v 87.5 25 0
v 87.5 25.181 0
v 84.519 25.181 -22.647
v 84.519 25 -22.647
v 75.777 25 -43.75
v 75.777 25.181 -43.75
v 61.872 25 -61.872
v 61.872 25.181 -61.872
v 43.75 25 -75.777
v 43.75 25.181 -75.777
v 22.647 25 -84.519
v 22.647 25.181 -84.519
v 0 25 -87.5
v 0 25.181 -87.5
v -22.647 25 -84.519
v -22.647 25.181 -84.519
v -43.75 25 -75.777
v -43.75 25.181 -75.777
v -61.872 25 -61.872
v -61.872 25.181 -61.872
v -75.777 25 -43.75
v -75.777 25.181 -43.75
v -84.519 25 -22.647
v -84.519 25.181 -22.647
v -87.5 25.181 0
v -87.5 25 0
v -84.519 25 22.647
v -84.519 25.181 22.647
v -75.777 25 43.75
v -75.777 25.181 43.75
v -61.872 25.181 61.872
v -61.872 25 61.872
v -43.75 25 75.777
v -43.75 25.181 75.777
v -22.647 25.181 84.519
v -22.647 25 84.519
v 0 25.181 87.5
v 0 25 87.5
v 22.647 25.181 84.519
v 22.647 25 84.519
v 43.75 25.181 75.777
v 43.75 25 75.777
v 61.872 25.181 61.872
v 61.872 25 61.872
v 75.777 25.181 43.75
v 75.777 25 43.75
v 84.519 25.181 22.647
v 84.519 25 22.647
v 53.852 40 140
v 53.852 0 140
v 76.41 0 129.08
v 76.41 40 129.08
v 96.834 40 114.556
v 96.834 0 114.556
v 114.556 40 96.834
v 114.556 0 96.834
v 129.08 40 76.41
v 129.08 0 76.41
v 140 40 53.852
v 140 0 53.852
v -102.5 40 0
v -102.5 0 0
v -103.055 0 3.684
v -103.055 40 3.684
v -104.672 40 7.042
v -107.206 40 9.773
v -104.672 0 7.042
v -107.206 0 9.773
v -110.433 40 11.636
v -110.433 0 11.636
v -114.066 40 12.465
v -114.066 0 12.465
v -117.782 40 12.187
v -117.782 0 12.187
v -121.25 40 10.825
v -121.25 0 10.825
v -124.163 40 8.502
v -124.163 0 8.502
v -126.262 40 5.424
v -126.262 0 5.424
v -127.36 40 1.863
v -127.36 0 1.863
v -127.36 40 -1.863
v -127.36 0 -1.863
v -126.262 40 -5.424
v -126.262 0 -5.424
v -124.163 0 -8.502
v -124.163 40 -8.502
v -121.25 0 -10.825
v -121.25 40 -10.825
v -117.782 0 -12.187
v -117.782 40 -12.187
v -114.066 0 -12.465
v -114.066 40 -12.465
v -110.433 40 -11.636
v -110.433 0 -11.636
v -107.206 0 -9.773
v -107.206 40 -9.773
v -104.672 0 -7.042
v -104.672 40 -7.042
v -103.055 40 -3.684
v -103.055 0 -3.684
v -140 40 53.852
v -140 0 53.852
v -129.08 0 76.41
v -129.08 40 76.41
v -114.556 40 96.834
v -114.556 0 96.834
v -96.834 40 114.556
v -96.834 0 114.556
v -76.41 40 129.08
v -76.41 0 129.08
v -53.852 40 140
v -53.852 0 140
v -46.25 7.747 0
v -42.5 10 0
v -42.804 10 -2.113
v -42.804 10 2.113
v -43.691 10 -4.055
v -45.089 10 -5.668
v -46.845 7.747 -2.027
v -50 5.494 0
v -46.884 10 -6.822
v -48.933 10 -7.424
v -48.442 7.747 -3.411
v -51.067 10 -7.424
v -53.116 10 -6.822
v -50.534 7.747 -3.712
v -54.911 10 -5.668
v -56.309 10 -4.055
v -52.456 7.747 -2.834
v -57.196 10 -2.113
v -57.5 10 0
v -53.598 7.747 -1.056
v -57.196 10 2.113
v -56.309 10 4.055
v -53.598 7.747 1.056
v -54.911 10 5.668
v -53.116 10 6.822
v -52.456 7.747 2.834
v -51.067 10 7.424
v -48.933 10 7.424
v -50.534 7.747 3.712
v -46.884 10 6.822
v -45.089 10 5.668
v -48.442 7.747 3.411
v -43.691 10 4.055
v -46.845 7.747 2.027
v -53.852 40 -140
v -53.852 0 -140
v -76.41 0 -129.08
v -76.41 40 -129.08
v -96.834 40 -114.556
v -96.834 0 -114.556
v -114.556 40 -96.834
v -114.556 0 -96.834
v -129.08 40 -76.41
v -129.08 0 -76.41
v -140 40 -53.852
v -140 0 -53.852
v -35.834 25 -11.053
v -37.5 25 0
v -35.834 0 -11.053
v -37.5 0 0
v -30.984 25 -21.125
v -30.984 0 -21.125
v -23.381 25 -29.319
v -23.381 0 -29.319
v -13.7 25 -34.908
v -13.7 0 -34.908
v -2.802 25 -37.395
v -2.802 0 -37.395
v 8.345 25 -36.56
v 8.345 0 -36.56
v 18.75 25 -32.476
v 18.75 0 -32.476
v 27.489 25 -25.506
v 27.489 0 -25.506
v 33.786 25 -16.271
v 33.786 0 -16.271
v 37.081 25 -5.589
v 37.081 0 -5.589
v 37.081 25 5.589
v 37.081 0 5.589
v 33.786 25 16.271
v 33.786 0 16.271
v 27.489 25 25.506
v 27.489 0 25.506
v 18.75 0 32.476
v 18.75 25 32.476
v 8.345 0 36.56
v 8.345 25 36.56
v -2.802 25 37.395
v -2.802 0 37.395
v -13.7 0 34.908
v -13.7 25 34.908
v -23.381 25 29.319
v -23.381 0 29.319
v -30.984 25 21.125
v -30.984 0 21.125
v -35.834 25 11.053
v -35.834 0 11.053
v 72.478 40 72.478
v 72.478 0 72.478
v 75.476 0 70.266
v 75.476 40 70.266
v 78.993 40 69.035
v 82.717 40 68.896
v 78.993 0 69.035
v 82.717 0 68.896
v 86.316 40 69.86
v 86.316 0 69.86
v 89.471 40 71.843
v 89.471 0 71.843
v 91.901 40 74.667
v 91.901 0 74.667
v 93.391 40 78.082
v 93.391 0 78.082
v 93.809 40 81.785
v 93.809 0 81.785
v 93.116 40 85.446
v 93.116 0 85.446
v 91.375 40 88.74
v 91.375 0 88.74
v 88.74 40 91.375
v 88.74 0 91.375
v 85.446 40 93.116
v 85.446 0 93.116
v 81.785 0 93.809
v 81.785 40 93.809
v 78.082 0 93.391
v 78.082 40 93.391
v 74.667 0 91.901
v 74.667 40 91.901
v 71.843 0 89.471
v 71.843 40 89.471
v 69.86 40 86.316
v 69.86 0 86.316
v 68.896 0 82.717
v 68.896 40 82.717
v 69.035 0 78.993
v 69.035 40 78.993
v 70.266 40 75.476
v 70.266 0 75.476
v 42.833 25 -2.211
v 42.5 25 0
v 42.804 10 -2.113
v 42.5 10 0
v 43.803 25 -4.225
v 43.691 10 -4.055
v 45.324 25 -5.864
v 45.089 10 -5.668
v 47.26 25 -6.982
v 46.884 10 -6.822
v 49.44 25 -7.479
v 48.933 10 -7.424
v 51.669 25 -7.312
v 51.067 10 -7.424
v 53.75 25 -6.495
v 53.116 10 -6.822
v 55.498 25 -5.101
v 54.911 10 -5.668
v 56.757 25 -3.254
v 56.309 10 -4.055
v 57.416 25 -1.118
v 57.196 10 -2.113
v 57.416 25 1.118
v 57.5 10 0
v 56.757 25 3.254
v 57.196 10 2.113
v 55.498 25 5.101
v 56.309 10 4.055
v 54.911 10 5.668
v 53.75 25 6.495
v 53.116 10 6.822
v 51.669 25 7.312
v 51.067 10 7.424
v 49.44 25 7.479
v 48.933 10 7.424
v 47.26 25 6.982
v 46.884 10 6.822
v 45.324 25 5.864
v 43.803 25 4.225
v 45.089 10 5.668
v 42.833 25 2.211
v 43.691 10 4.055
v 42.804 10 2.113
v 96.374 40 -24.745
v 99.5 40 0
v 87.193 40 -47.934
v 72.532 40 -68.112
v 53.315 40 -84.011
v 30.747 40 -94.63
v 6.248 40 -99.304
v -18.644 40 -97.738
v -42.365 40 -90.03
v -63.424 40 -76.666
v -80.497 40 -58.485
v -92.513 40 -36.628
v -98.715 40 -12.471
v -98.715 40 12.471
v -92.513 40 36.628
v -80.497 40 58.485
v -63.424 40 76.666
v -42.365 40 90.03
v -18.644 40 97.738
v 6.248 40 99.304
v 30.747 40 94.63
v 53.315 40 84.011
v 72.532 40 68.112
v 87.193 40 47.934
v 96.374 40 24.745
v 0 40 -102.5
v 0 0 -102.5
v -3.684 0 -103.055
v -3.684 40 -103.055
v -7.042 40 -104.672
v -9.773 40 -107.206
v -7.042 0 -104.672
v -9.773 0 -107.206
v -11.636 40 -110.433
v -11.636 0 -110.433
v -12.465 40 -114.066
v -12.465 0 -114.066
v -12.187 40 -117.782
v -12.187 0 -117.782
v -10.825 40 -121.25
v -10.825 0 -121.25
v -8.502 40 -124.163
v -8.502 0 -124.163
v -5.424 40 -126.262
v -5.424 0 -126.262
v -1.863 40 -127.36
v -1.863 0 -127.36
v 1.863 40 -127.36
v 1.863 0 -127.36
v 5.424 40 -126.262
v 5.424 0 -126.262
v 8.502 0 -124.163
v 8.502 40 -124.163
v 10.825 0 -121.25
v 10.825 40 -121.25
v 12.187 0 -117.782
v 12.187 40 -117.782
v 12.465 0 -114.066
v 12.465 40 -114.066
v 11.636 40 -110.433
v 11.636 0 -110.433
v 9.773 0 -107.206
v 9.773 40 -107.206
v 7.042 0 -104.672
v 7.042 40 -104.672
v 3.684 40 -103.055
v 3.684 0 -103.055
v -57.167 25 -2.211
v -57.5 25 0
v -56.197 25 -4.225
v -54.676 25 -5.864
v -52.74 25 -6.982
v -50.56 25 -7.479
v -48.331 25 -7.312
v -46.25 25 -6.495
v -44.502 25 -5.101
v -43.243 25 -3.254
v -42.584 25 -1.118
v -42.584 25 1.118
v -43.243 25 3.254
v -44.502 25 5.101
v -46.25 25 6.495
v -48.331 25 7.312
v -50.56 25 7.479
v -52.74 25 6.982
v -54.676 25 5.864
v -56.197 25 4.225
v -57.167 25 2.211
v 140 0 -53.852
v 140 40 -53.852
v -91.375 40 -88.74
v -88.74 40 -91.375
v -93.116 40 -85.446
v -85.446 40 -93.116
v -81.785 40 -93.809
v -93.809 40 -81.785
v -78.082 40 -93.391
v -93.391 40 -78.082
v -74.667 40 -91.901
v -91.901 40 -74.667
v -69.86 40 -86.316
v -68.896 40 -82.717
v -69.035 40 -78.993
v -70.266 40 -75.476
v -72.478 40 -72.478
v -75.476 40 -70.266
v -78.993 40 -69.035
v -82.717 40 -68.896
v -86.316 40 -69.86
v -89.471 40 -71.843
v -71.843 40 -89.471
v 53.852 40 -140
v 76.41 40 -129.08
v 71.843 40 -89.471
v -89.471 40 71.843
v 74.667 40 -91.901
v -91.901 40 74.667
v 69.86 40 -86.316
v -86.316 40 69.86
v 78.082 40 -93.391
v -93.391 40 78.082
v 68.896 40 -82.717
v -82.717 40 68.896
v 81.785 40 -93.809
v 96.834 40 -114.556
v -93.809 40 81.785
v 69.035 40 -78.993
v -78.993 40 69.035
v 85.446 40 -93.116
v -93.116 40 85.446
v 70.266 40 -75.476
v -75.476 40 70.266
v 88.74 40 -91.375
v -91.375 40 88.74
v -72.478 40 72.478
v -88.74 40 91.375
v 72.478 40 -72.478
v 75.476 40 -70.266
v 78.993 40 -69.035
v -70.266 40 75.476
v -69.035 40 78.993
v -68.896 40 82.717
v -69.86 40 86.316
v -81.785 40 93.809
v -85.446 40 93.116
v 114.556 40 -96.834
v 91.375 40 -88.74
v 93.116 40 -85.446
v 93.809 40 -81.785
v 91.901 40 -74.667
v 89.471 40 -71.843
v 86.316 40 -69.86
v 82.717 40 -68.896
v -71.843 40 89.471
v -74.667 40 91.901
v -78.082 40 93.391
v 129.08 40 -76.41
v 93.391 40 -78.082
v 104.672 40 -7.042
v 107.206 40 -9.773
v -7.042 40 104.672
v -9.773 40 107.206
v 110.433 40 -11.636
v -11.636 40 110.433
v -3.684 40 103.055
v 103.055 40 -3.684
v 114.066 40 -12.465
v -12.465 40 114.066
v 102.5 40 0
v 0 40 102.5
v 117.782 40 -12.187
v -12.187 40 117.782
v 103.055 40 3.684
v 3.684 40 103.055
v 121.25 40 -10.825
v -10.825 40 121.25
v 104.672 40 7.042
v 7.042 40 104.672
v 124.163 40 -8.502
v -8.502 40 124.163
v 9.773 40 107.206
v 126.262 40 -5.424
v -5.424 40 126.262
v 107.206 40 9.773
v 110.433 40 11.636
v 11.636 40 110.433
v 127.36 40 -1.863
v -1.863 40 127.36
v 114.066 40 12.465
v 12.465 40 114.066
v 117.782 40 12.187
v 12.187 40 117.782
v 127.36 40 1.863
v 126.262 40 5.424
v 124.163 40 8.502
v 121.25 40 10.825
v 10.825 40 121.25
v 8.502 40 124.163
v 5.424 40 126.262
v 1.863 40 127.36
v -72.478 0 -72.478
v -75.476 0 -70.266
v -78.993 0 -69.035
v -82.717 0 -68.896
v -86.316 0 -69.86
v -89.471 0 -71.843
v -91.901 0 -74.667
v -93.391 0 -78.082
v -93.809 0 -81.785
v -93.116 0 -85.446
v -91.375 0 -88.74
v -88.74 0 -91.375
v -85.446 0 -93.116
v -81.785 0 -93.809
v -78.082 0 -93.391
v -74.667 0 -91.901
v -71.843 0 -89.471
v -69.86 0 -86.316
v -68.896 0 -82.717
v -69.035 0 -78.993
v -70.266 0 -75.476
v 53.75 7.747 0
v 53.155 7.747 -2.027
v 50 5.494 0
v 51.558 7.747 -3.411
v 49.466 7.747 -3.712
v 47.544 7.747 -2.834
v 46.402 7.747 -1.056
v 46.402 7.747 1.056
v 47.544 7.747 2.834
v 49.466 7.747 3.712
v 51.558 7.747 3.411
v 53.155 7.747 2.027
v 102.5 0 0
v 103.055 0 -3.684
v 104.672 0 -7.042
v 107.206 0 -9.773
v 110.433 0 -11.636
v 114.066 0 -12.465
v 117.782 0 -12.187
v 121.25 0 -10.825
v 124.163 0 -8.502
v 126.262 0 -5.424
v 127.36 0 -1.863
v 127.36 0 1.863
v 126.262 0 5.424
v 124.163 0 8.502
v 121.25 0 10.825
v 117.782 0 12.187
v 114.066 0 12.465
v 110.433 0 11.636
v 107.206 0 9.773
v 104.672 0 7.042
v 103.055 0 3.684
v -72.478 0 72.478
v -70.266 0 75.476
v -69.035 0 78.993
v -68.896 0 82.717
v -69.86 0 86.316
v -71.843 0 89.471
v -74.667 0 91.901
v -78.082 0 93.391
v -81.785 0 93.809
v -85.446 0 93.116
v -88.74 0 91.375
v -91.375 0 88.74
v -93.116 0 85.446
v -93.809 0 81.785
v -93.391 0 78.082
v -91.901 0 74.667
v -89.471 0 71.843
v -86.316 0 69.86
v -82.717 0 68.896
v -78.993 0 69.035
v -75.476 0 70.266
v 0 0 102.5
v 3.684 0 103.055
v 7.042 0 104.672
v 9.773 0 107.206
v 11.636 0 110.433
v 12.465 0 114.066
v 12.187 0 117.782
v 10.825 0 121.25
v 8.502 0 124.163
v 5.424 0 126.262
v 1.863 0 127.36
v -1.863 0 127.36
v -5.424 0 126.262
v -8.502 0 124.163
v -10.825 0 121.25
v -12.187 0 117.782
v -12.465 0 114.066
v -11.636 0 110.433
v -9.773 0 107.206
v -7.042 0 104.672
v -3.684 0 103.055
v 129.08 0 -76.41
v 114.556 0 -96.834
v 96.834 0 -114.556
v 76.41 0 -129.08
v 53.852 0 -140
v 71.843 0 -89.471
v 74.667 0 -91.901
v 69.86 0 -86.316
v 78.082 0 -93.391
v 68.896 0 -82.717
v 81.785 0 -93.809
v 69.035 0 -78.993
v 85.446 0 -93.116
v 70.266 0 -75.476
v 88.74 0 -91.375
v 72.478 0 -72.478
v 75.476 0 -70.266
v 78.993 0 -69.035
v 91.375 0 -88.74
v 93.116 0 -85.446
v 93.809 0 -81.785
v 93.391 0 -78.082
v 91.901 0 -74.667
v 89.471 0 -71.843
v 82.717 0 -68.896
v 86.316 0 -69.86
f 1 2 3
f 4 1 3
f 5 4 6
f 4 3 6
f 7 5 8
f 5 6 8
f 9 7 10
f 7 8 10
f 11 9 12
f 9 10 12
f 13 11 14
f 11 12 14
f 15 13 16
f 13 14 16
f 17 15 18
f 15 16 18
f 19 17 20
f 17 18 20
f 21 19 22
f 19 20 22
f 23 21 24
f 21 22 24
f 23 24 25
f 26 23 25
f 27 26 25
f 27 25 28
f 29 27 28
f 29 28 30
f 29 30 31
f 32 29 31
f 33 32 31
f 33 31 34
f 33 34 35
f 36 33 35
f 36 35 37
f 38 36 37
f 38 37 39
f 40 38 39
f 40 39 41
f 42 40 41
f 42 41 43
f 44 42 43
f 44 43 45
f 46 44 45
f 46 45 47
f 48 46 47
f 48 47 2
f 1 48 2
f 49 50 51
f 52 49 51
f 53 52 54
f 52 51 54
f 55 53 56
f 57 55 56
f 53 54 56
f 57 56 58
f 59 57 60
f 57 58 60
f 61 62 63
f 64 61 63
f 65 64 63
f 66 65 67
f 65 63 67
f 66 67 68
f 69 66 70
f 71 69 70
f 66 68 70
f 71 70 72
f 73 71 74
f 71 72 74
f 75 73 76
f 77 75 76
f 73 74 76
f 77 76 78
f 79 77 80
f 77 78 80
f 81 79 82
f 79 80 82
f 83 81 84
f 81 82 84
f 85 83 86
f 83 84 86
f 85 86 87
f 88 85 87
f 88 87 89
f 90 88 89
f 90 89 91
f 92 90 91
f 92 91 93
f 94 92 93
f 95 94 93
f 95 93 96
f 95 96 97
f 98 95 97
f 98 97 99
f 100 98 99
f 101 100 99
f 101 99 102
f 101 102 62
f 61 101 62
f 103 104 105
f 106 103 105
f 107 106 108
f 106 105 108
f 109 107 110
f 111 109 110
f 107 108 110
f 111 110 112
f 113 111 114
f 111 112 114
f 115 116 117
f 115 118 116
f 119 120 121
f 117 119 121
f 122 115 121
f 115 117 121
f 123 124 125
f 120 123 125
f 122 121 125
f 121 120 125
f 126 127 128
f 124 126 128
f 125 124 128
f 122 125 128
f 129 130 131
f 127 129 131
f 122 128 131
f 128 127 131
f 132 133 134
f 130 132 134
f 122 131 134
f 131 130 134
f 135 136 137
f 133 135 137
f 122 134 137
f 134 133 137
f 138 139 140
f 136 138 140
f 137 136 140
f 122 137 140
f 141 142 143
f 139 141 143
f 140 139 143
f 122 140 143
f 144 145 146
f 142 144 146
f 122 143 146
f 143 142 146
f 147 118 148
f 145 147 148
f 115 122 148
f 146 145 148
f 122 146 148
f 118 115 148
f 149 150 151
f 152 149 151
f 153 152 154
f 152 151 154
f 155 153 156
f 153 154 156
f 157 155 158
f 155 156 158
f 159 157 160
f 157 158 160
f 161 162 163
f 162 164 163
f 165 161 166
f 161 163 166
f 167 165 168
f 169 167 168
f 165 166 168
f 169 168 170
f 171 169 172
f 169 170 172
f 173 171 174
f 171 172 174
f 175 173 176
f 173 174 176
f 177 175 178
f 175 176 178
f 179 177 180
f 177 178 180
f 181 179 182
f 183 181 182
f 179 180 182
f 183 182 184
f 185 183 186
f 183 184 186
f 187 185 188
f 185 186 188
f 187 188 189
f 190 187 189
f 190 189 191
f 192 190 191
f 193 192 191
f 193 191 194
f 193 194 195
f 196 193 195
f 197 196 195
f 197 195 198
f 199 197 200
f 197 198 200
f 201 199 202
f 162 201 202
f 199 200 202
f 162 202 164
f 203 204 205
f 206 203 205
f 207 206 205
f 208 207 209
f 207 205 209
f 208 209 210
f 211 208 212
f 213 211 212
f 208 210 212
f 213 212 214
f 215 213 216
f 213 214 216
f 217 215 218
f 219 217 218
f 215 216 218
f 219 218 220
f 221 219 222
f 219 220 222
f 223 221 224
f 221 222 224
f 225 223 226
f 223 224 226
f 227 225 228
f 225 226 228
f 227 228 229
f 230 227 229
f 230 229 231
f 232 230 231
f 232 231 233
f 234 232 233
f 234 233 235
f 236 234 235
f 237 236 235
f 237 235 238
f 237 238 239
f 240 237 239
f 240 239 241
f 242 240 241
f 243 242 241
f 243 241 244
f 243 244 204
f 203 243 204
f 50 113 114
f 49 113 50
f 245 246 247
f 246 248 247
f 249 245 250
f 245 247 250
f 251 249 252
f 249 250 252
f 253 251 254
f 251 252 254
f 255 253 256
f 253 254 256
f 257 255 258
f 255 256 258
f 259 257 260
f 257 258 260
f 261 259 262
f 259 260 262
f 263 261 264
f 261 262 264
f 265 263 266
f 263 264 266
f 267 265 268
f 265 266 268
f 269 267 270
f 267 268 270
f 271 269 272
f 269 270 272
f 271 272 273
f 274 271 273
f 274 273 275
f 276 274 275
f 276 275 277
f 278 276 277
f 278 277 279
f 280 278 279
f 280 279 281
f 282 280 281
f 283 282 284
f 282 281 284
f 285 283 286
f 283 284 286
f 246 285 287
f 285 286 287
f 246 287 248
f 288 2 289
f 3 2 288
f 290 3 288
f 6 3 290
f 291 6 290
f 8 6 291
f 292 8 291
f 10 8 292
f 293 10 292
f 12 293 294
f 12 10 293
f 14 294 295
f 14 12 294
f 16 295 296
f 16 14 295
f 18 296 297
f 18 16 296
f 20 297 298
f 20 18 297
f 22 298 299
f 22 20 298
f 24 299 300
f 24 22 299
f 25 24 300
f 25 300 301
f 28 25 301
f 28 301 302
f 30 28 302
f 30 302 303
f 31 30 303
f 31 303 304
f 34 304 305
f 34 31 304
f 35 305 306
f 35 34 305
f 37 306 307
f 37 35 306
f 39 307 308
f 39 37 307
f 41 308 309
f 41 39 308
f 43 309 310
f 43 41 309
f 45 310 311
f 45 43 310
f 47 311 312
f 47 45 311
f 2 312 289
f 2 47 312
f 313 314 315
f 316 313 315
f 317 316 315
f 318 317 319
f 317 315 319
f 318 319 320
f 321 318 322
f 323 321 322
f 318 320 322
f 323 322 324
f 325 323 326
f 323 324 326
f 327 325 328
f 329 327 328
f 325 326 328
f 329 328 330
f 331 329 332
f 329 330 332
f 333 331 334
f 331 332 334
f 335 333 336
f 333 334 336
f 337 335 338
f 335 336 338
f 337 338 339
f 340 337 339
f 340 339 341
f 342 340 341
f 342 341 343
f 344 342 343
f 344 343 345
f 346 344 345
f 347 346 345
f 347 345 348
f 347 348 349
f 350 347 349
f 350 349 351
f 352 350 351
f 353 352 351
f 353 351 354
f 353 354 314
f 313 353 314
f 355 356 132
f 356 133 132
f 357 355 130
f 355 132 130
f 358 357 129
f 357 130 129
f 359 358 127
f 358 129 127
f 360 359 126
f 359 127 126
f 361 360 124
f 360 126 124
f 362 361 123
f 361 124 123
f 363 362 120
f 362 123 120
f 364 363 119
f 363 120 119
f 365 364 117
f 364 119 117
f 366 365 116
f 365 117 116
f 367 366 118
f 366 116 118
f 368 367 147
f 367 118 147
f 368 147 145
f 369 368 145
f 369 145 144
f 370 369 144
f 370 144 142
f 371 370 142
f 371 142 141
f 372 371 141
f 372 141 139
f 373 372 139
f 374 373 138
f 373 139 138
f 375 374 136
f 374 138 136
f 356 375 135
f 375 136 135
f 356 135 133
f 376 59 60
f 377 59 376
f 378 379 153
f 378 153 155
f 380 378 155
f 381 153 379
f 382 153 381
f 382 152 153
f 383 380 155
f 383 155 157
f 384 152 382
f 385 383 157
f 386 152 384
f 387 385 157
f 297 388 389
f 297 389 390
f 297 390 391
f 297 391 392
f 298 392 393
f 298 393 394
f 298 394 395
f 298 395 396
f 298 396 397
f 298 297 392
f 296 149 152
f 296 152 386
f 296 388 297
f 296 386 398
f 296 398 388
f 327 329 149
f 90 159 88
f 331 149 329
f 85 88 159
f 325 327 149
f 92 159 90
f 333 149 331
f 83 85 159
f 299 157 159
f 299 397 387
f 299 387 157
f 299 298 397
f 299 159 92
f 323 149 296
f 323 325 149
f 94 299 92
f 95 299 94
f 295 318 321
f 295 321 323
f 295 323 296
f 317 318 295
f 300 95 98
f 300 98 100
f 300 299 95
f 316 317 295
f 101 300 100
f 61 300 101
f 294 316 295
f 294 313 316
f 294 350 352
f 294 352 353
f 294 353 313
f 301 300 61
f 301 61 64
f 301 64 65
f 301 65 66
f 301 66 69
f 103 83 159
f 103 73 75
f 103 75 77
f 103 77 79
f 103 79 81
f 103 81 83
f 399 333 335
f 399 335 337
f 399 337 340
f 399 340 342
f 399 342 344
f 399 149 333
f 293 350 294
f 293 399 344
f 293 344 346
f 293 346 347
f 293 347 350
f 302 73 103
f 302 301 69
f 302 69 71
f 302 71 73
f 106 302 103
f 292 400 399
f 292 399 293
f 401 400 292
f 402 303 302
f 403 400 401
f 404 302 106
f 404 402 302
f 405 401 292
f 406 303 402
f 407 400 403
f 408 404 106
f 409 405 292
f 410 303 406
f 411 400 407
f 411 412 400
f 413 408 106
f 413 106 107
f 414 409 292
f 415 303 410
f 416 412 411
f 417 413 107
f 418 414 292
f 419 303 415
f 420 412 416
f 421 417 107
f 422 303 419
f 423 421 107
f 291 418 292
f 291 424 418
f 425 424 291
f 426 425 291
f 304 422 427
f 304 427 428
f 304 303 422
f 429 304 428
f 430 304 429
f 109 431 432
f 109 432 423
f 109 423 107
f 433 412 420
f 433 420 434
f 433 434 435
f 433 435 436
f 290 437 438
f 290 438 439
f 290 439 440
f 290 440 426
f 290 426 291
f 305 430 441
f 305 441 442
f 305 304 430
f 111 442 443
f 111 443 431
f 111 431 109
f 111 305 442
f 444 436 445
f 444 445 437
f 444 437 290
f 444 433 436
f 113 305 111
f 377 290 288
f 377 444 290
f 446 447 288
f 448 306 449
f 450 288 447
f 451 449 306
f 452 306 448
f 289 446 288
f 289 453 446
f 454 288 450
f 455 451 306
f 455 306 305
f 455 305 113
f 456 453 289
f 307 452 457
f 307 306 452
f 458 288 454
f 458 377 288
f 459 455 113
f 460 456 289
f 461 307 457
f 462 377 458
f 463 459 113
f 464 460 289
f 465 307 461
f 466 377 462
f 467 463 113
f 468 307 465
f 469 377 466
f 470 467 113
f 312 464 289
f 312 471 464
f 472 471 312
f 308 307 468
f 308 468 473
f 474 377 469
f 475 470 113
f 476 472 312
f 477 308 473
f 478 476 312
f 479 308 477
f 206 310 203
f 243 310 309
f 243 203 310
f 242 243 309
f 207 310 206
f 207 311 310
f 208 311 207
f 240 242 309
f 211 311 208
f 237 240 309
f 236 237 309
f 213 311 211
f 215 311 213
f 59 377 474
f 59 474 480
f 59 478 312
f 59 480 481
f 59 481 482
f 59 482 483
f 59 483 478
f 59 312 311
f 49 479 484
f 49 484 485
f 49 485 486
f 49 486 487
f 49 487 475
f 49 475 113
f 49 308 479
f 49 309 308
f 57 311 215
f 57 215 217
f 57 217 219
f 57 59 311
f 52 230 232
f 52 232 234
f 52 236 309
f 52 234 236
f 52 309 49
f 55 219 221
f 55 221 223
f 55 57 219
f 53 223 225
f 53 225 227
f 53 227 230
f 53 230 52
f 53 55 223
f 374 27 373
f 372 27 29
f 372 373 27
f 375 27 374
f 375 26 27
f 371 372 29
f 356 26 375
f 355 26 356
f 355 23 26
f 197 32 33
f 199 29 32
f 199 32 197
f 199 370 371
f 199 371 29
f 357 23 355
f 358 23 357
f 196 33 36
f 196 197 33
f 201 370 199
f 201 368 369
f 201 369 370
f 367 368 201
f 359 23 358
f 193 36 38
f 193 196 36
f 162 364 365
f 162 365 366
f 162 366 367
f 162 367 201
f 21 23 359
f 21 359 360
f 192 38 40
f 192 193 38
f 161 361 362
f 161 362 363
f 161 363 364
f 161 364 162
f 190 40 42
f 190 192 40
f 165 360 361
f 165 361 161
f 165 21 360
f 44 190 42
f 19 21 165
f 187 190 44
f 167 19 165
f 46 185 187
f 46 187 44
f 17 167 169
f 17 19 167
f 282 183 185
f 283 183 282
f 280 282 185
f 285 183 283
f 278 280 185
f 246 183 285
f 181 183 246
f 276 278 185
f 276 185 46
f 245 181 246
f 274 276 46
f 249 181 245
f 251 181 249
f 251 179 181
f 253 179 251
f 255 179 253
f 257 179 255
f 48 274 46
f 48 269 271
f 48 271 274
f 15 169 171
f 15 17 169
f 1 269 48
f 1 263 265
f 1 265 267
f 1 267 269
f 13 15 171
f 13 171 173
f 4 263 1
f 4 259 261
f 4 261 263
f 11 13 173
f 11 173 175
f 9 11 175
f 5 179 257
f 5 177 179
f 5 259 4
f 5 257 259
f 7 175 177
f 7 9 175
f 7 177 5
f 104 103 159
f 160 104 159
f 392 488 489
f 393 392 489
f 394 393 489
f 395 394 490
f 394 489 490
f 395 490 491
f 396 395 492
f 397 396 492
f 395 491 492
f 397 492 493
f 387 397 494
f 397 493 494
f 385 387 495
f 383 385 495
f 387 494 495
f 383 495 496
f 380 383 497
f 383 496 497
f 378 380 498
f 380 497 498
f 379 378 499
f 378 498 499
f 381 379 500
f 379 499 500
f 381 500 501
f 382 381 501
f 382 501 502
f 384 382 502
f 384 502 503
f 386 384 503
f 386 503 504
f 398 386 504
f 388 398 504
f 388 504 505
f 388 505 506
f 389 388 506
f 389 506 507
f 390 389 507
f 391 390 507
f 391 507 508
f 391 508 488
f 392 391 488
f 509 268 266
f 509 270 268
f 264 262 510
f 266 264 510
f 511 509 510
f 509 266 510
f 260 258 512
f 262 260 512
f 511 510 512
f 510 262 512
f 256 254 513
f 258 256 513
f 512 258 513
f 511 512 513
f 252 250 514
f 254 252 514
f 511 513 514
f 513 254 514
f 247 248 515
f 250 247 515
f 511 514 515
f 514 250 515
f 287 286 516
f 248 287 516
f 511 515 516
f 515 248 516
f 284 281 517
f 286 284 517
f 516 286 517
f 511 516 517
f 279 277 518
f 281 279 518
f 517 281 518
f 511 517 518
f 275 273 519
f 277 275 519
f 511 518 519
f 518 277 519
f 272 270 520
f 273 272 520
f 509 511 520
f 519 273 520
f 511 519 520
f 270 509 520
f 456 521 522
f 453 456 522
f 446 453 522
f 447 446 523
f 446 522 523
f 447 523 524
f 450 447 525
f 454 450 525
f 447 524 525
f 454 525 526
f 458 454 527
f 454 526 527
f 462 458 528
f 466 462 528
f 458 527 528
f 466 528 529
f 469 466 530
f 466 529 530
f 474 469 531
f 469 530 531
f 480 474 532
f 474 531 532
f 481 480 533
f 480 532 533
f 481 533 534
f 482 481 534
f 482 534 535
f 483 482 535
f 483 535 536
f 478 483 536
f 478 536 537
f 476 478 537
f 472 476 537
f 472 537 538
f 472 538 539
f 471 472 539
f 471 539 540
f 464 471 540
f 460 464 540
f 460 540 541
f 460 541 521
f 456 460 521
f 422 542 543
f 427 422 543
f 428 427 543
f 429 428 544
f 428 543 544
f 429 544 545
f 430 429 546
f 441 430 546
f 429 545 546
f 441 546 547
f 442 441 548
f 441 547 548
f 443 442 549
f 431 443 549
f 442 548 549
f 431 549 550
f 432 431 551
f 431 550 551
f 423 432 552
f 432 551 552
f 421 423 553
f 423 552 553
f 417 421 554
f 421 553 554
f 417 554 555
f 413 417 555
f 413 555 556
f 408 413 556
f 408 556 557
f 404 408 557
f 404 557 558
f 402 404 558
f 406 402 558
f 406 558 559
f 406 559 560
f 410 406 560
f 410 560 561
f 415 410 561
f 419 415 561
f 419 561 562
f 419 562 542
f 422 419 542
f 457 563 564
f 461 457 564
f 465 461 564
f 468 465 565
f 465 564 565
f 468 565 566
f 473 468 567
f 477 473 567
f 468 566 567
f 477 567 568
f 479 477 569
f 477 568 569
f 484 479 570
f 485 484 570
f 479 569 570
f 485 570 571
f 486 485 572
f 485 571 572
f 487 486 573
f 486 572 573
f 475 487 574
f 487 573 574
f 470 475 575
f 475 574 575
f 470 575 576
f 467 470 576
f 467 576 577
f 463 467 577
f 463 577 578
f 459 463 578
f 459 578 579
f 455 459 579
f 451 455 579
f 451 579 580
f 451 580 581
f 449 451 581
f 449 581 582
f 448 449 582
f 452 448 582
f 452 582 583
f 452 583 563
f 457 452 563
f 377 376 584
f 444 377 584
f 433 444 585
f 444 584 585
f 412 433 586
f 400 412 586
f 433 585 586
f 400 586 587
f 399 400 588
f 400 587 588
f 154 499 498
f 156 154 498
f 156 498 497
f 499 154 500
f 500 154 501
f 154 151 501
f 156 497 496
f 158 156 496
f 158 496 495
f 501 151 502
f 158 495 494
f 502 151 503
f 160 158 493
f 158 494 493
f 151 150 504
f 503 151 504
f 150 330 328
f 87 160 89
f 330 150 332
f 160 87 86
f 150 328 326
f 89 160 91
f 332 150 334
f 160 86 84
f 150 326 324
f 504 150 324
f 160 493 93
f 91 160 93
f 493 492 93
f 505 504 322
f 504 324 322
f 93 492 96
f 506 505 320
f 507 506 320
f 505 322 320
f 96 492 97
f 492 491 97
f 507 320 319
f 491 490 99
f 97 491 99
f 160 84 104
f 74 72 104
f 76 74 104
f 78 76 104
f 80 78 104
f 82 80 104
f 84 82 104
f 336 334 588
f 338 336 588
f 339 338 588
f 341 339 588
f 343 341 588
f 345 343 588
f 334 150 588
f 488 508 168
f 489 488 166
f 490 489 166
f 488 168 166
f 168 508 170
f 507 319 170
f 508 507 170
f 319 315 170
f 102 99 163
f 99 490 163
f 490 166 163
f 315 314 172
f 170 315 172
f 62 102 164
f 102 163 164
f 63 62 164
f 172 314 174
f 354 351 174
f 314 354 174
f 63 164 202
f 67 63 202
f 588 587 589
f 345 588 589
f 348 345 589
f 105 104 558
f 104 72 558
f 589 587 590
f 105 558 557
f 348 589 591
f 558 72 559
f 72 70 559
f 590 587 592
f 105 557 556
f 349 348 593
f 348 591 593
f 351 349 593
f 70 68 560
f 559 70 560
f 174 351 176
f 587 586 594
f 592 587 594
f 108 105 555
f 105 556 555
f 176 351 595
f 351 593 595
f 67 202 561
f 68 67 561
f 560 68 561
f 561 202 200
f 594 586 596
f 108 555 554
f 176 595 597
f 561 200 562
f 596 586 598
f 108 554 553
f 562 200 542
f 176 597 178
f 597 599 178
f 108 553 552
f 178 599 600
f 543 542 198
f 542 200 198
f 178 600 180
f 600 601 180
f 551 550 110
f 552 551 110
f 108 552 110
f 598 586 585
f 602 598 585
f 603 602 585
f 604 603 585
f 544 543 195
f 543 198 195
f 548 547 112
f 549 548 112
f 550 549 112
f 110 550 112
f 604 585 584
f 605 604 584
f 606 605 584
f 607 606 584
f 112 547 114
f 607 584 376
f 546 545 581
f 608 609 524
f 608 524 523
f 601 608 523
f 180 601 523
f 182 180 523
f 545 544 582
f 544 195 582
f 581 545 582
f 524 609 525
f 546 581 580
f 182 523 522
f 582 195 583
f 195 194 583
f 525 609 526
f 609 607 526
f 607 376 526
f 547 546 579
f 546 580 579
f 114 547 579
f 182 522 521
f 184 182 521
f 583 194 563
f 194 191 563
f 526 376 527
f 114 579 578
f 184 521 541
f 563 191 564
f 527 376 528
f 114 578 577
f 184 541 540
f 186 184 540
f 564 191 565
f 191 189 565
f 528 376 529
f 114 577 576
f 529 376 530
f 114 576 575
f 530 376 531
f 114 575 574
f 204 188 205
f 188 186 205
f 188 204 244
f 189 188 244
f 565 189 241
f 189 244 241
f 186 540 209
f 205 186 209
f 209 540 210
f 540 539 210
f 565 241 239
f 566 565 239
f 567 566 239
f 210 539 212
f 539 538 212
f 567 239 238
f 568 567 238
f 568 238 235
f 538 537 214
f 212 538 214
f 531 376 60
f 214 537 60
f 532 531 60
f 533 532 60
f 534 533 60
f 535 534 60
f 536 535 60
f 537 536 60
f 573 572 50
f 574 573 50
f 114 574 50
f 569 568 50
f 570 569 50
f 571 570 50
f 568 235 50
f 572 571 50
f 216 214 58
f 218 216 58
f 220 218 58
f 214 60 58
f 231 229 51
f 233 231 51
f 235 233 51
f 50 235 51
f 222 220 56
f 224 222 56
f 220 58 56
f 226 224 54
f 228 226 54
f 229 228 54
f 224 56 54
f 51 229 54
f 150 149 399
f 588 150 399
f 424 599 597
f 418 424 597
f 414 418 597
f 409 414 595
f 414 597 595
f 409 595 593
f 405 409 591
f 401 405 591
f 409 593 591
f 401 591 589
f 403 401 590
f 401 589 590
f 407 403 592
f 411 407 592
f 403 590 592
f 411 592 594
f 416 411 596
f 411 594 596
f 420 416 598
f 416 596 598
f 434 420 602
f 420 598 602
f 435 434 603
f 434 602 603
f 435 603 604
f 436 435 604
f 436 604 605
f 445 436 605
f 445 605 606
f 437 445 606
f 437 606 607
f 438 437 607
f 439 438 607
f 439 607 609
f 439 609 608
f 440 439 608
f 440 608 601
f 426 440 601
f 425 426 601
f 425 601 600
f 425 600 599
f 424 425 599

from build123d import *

# Parameters (mm, degrees)
SKETCH1_R                                = 150
BOSS_EXTRUDE1_DEPTH                      = 40
CBORE_FOR_M64_HEX_HEAD_BOLT1_D           = 75
CBORE_FOR_M64_HEX_HEAD_BOLT1_CBORE_D     = 175
CBORE_FOR_M64_HEX_HEAD_BOLT1_CBORE_DEPTH = 15
F_25_0_25_DIAMETER_HOLE1_D               = 25
CIRPATTERN2_COUNT                        = 8
CHAMFER1_SIZE                            = 12
CHAMFER1_SIZE2                           = 14.818765878
F_15_0_15_DIAMETER_HOLE1_D               = 15
F_15_0_15_DIAMETER_HOLE1_DEPTH           = 15
F_15_0_15_DIAMETER_HOLE1_TIP             = 4.506454643


with BuildPart() as part:
    # Sketch1 → Boss-Extrude1 (new body)
    with BuildSketch(Plane(origin=(0, 0, 0), x_dir=(1, 0, 0), z_dir=(0, 1, 0))):
        with Locations(Location((0, 0, 0), (0, 0, 270))):
            Circle(SKETCH1_R)
    extrude(amount=BOSS_EXTRUDE1_DEPTH)

    # CBORE for M64 Hex Head Bolt1 (through all)
    with Locations(Plane(origin=(0, 40, 0), x_dir=(1, 0, 0), z_dir=(0, 1, 0))):
        with Locations((0, 0)):
            CounterBoreHole(CBORE_FOR_M64_HEX_HEAD_BOLT1_D / 2, CBORE_FOR_M64_HEX_HEAD_BOLT1_CBORE_D / 2, CBORE_FOR_M64_HEX_HEAD_BOLT1_CBORE_DEPTH)

    # Ø25.0 (25) Diameter Hole1 (through all)
    with Locations(Plane(origin=(0, 40, 0), x_dir=(1, 0, 0), z_dir=(0, 1, 0))):
        with Locations((115, 0)):
            f_25_0_25_diameter_hole1 = Hole(F_25_0_25_DIAMETER_HOLE1_D / 2)

    # CirPattern2: Ø25.0 (25) Diameter Hole1 ×8 about axis
    cirpattern2_axis = Axis((0, 0, 0), (0, 1, 0))
    for i in range(1, CIRPATTERN2_COUNT):
        add(f_25_0_25_diameter_hole1.rotate(cirpattern2_axis, i * 360 / CIRPATTERN2_COUNT), mode=Mode.SUBTRACT)

    # Chamfer1
    chamfer1_edges = [part.edges().sort_by_distance(p)[0] for p in [
        (-87.5, 40, 0),
    ]]
    chamfer1_side = [part.faces().sort_by_distance(p)[0] for p in [
        (0, 40, -145.757359313),
    ]]
    chamfer(chamfer1_edges, length=CHAMFER1_SIZE, length2=CHAMFER1_SIZE2, reference=chamfer1_side[0])

    # SurfaceCut1
    split(bisect_by=Plane(origin=(-140, 0, 0), x_dir=(0, 0, -1), z_dir=(1, 0, 0)), keep=Keep.TOP)

    # SurfaceCut2
    split(bisect_by=Plane.XY.offset(140), keep=Keep.BOTTOM)

    # SurfaceCut3
    split(bisect_by=Plane(origin=(140, 0, 0), x_dir=(0, 0, -1), z_dir=(1, 0, 0)), keep=Keep.BOTTOM)

    # SurfaceCut4
    split(bisect_by=Plane.XY.offset(-140), keep=Keep.TOP)

    # Ø15.0 (15) Diameter Hole1
    with Locations(Plane(origin=(0, 25, 0), x_dir=(1, 0, 0), z_dir=(0, 1, 0))):
        with Locations((-50, 0), (50, 0)):
            Hole(F_15_0_15_DIAMETER_HOLE1_D / 2, depth=F_15_0_15_DIAMETER_HOLE1_DEPTH)
            with Locations((0, 0, -(F_15_0_15_DIAMETER_HOLE1_DEPTH + F_15_0_15_DIAMETER_HOLE1_TIP / 2))):  # 118° drill point
                Cone(0, F_15_0_15_DIAMETER_HOLE1_D / 2, F_15_0_15_DIAMETER_HOLE1_TIP, mode=Mode.SUBTRACT)


solid = part.part
